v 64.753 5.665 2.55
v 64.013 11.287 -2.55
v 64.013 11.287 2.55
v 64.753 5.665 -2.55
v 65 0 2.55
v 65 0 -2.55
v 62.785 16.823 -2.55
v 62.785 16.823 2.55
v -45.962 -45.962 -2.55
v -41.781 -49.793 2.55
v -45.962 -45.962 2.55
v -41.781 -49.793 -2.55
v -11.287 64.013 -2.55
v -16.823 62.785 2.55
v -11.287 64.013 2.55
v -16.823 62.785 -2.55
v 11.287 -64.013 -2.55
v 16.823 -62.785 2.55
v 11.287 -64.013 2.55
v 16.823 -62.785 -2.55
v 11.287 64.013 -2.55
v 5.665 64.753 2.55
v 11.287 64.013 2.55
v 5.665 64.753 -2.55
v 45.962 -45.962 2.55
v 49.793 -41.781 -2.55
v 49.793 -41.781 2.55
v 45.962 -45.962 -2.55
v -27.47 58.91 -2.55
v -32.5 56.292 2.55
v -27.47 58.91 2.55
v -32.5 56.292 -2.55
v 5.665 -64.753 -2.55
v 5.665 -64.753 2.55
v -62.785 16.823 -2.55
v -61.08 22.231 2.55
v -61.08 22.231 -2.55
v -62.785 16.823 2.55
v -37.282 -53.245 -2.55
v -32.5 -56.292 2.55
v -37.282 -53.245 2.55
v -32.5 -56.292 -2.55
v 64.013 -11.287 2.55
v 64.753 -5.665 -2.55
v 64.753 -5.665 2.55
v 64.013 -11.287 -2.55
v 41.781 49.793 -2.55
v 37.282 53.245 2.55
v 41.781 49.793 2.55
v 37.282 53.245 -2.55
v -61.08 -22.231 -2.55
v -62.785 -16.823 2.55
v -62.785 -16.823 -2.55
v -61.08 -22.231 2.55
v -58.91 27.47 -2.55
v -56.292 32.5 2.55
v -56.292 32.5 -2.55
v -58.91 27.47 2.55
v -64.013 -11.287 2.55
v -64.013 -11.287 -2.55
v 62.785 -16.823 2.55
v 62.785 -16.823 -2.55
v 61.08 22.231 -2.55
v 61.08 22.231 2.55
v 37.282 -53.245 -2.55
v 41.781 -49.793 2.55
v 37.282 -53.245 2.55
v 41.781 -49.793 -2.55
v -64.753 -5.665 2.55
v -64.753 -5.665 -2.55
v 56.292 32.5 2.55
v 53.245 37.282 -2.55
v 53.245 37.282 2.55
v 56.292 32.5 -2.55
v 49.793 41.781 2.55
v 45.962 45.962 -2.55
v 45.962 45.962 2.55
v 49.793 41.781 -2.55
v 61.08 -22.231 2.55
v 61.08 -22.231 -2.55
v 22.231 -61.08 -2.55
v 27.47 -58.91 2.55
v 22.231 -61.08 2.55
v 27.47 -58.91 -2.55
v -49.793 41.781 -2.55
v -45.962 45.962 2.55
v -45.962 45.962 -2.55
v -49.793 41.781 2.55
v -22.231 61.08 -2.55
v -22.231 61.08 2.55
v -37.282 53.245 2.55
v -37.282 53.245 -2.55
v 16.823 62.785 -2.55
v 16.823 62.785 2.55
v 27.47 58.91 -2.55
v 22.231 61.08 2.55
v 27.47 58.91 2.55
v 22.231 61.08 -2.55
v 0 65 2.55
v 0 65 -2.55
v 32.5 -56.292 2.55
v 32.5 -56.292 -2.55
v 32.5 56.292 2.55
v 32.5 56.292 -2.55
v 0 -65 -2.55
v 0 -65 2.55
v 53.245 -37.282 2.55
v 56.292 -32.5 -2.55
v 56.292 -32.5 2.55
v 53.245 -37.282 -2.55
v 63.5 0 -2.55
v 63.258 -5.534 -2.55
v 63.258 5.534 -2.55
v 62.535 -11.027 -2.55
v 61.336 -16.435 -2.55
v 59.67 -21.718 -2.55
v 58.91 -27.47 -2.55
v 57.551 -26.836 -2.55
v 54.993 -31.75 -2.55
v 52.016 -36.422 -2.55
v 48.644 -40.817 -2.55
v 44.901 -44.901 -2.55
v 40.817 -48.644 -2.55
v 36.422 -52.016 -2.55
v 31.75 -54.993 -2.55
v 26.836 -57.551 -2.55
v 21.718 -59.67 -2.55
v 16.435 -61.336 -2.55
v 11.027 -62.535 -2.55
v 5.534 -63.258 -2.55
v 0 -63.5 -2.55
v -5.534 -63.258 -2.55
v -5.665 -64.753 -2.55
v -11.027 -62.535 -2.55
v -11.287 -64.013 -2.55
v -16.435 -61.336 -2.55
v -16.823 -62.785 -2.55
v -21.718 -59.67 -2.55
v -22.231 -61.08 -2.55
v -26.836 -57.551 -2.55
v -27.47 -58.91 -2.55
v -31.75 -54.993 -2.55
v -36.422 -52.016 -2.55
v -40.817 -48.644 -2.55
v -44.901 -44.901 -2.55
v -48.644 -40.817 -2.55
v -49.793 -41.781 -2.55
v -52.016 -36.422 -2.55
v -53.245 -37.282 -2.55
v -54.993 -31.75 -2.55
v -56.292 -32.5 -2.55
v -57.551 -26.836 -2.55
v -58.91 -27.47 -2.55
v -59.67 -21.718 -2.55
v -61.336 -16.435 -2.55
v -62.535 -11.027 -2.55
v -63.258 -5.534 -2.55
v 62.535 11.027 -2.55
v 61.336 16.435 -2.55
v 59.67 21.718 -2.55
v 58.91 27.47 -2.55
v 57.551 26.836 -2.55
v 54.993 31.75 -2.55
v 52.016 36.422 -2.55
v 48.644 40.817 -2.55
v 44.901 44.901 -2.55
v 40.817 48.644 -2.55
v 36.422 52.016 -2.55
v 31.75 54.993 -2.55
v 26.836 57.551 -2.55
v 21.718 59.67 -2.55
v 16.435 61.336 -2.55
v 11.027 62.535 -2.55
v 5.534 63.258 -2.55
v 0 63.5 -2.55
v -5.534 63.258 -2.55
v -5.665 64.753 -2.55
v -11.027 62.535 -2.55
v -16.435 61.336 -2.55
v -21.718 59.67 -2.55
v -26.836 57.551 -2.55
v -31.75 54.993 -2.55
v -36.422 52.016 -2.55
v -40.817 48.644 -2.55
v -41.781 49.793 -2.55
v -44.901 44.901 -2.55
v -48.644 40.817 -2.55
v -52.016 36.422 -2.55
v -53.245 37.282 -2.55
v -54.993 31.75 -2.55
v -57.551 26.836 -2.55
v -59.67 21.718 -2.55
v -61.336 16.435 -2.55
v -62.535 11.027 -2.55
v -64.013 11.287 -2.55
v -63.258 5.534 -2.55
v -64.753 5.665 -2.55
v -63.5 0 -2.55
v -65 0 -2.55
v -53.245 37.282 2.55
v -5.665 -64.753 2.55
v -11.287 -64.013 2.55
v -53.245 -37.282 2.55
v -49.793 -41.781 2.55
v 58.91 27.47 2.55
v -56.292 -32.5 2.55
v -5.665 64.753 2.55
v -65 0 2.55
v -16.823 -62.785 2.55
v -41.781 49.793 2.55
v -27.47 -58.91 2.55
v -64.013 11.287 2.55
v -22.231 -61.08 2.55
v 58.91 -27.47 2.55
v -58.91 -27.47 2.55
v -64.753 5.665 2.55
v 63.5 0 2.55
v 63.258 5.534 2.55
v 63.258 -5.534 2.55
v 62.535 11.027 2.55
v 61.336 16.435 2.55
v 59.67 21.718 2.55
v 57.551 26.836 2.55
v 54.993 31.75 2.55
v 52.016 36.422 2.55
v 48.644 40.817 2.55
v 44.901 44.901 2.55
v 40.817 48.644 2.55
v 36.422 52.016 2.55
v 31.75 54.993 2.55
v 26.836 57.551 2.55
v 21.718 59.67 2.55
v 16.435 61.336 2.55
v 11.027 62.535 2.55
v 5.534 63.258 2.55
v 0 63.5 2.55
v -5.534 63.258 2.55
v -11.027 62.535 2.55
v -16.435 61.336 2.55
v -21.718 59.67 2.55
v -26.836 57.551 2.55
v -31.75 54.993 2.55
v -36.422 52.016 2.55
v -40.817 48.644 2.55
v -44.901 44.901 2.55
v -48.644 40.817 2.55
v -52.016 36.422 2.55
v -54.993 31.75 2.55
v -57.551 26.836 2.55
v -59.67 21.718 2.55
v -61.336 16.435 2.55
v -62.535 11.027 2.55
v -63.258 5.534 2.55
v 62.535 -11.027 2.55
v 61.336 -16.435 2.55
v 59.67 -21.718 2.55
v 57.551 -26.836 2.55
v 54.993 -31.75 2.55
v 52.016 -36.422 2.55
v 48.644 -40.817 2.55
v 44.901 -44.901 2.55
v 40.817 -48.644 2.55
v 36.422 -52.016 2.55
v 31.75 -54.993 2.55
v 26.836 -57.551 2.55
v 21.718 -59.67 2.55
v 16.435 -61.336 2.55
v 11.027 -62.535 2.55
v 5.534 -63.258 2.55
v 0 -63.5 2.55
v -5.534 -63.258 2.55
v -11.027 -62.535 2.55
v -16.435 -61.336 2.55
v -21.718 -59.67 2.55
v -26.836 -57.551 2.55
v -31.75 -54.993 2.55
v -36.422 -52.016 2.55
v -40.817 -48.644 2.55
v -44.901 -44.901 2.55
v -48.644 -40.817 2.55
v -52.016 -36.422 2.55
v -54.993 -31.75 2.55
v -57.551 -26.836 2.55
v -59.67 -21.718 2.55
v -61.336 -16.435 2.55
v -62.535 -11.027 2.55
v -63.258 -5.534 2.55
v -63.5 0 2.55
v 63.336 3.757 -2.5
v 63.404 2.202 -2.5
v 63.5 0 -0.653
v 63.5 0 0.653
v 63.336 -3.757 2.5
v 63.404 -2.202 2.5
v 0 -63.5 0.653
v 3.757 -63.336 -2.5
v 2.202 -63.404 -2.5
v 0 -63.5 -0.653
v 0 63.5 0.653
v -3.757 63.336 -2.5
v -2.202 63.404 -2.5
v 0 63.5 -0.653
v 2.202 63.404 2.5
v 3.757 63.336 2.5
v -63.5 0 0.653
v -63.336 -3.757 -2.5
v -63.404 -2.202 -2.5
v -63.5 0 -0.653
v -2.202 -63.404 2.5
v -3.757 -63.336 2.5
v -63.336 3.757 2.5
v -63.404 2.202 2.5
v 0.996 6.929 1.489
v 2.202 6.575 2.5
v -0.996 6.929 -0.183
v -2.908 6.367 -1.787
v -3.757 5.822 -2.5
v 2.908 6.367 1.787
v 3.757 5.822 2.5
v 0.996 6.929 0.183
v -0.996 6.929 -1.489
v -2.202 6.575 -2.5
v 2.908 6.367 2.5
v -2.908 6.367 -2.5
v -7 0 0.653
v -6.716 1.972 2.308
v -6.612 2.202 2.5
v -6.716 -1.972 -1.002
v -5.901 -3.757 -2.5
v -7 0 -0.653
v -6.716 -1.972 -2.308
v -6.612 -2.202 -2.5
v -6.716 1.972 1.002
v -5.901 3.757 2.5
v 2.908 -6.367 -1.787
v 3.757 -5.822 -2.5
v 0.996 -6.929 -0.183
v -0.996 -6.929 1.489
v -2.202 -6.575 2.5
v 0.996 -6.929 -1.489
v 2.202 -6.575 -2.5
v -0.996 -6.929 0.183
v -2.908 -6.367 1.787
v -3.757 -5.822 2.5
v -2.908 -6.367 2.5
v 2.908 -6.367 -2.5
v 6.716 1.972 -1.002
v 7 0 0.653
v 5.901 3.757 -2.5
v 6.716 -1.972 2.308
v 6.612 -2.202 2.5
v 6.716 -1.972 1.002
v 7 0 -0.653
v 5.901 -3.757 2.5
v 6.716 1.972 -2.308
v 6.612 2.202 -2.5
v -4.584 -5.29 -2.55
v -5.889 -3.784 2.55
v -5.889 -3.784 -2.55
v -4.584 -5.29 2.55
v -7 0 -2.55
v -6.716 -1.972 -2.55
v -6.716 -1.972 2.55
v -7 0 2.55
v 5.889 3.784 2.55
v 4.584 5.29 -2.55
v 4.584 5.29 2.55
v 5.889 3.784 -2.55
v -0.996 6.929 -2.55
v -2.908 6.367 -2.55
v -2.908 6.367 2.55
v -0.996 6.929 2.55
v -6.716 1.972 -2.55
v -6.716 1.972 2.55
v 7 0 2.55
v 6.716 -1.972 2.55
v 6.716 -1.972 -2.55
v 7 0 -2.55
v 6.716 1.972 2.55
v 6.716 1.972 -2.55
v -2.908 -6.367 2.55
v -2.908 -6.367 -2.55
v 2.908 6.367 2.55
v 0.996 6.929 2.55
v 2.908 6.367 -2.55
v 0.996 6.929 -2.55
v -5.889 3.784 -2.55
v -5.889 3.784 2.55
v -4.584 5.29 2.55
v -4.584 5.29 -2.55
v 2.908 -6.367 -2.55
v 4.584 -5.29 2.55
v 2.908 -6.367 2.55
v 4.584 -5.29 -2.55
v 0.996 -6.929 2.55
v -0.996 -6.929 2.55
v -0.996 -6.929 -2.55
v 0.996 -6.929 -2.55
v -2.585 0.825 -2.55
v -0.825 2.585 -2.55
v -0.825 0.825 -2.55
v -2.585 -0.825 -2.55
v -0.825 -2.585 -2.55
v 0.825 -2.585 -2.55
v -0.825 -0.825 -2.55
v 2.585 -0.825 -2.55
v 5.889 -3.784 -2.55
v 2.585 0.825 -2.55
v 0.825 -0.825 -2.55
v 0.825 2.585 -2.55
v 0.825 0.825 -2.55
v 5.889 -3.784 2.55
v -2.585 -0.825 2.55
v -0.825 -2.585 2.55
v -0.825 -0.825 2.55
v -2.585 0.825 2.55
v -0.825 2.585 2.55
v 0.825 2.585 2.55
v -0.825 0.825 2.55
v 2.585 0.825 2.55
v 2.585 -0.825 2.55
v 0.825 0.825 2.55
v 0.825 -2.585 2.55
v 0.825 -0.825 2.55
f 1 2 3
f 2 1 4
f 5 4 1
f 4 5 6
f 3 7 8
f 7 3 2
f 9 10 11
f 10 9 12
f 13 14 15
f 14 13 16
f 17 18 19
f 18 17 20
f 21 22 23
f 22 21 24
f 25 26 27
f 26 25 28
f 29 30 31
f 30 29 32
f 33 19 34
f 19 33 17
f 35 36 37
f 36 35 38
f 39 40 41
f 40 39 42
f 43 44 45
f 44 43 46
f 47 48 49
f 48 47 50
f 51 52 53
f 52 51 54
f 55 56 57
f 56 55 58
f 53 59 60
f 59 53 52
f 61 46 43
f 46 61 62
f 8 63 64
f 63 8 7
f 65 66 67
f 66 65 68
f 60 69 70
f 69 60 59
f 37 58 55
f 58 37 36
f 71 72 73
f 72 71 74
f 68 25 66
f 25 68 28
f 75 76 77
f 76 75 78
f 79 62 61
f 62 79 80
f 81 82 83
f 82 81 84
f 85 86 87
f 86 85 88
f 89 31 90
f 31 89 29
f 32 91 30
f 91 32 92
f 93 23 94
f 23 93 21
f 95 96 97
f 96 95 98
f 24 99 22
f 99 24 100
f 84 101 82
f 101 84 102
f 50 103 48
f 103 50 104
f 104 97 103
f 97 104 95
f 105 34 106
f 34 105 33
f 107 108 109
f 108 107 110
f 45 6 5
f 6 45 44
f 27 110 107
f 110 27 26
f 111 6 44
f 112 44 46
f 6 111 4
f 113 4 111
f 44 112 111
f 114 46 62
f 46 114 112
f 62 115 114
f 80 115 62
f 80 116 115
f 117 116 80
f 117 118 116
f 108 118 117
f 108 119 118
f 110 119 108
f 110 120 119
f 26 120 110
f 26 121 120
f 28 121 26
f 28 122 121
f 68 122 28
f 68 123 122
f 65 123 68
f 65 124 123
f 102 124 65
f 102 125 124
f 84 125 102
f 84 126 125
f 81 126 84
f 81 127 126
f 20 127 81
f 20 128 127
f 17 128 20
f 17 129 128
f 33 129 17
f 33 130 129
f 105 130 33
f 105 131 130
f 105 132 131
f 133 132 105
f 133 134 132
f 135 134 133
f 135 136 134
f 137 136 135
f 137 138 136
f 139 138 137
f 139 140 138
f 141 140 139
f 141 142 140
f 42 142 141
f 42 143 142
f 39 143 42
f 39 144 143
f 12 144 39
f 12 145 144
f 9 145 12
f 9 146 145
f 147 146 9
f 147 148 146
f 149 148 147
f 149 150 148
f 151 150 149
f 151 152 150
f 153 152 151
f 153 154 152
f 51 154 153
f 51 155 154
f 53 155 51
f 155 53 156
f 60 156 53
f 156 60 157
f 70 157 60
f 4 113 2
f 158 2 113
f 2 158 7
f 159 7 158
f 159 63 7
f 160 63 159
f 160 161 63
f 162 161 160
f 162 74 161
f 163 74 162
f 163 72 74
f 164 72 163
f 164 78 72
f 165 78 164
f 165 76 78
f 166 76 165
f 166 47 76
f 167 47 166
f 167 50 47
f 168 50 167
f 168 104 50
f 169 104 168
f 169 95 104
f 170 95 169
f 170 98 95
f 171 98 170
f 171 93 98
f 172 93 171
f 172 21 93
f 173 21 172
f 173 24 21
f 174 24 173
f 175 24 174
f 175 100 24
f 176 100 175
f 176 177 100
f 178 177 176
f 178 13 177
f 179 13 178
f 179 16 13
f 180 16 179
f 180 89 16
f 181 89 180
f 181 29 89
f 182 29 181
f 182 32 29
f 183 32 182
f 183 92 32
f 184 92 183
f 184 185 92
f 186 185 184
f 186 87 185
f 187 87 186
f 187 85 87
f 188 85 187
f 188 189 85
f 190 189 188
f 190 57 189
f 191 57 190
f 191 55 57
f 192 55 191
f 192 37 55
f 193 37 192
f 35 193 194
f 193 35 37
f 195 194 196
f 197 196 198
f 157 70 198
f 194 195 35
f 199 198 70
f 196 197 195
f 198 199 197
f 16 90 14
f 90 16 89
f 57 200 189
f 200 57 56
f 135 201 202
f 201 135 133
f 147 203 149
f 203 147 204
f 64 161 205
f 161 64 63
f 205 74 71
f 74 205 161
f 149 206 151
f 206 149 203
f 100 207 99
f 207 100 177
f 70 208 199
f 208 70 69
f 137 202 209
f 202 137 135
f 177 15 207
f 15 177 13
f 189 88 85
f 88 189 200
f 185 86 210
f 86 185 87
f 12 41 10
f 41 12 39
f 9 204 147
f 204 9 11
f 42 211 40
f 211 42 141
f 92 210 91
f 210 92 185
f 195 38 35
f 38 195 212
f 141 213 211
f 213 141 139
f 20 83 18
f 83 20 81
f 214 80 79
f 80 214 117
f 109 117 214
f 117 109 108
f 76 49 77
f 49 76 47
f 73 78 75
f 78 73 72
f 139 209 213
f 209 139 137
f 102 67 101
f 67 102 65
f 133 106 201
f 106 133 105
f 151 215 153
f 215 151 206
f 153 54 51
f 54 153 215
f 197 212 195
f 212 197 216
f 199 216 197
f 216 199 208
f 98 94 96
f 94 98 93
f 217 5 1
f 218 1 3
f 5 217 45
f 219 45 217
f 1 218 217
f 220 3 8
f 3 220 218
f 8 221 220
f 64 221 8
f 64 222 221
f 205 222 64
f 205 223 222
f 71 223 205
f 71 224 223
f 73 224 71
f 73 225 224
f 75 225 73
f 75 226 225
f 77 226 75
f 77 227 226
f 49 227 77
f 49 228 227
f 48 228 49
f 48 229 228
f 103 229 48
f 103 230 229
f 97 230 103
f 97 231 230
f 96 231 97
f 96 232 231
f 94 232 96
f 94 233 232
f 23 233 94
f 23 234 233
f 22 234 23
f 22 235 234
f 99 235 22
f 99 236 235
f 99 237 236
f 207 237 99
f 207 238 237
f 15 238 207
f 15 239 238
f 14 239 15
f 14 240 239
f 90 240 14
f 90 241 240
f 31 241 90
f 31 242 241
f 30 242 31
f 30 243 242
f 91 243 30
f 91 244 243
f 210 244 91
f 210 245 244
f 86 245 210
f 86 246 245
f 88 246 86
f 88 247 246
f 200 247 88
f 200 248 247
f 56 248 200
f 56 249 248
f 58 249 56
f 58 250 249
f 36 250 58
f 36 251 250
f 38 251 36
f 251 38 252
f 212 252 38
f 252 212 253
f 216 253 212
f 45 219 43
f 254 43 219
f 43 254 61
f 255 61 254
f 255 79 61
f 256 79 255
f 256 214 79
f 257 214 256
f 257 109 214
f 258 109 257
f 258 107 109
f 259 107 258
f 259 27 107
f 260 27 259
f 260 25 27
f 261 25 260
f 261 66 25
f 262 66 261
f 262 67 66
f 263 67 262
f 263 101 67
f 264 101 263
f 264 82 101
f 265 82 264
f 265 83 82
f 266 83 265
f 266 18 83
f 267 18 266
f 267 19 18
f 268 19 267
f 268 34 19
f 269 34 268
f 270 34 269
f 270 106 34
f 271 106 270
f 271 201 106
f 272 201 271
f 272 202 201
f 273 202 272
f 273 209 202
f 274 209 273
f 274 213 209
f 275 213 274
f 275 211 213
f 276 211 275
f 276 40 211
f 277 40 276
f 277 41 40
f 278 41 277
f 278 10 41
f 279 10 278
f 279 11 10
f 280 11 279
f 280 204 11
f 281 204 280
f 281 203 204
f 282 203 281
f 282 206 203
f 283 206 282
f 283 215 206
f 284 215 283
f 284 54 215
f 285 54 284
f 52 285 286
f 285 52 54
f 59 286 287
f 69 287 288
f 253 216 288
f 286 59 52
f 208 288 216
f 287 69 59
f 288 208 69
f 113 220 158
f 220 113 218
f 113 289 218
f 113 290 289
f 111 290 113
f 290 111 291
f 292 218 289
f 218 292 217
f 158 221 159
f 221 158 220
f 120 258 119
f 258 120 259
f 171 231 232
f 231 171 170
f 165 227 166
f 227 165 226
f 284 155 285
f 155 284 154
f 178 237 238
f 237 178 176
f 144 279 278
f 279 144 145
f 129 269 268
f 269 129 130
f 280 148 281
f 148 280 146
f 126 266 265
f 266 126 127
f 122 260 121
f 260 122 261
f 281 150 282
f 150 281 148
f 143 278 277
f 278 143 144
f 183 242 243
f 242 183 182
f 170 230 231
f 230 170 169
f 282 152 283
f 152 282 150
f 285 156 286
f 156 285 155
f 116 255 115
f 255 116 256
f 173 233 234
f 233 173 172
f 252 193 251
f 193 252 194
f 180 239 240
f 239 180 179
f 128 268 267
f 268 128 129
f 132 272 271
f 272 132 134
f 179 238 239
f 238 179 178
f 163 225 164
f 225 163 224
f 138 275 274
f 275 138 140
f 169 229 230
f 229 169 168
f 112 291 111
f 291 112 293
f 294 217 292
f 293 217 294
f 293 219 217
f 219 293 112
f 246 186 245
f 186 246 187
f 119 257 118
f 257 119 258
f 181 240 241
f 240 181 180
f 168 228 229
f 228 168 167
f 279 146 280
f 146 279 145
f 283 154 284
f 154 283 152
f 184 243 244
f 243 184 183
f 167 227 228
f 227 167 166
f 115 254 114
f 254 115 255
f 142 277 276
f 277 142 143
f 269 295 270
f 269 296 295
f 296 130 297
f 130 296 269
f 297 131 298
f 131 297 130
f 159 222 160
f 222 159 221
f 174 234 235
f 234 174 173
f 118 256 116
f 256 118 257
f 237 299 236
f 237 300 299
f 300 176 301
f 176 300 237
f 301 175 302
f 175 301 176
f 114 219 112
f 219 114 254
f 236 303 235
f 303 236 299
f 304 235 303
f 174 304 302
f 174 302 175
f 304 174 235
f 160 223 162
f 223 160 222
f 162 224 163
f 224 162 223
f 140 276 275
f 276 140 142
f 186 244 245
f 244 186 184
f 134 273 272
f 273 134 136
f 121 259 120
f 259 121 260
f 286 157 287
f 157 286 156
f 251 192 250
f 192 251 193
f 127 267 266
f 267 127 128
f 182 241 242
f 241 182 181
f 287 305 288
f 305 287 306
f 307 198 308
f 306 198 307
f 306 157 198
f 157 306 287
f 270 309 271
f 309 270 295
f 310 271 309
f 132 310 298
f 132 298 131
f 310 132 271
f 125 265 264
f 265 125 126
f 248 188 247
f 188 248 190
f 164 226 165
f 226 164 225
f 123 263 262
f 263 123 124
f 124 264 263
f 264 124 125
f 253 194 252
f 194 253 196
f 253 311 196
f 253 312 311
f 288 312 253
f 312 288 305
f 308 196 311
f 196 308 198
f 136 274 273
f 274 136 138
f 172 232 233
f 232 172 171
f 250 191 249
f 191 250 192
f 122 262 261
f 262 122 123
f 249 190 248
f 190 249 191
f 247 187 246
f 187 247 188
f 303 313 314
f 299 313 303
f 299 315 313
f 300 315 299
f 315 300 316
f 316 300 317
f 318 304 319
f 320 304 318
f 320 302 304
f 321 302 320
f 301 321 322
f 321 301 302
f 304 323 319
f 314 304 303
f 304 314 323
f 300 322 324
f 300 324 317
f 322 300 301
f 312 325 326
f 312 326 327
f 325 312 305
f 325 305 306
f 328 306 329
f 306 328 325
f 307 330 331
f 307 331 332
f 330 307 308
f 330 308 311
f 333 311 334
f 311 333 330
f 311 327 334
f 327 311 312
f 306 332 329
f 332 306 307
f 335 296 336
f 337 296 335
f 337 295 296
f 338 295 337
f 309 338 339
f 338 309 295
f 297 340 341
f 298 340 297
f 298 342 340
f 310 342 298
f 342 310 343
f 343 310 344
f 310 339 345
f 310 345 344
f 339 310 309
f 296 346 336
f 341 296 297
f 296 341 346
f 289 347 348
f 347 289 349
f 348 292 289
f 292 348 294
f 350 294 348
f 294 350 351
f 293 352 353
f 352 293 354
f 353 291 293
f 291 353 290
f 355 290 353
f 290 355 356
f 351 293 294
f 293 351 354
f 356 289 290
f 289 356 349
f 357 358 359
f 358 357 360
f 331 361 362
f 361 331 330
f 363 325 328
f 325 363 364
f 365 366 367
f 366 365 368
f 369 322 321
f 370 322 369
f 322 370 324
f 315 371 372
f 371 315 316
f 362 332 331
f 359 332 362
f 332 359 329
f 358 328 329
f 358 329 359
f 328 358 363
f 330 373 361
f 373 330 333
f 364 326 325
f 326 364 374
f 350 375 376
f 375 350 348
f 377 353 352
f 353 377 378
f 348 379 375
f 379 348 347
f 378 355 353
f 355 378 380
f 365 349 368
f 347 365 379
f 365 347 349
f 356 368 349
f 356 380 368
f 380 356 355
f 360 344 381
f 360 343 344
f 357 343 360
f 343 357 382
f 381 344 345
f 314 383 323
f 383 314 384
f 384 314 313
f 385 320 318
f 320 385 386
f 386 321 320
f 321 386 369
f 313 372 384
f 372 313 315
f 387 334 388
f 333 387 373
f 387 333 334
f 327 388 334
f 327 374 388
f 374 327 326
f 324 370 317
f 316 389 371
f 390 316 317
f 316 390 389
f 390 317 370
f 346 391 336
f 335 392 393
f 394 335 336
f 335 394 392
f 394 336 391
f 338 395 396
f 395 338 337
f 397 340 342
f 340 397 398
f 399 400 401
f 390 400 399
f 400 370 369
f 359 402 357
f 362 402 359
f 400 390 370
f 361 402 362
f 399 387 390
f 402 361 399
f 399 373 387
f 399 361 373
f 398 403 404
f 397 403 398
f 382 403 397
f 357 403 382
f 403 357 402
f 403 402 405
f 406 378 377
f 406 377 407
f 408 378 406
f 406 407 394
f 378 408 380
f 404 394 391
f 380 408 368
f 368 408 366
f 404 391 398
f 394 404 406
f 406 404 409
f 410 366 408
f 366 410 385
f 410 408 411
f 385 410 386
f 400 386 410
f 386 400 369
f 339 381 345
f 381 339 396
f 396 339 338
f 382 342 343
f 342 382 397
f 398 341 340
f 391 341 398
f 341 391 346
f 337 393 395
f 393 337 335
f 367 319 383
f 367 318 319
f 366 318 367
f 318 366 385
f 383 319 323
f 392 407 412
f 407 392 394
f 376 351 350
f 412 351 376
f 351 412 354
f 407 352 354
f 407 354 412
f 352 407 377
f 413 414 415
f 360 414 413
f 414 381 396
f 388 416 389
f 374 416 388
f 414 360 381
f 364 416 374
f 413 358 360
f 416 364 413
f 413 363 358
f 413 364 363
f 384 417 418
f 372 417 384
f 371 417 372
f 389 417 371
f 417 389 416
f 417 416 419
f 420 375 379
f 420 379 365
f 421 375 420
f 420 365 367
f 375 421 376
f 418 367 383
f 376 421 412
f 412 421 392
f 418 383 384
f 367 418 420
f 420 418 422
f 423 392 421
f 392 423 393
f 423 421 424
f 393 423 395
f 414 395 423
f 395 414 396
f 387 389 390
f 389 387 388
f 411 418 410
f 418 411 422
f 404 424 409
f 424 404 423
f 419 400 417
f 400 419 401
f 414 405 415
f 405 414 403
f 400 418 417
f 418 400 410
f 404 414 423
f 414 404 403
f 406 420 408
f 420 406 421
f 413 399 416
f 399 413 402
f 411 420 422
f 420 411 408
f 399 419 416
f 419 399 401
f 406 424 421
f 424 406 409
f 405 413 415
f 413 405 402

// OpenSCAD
/*****************************************************************************
    Propeller 
	
	Modified from: https://www.thingiverse.com/thing:291404/files			
                                    
*****************************************************************************/

// Thickness of outer ring wall.
outer_ring_thickness = 1.5;
outer_ring_od = 130;
blade_thickness = 1.0;
blade_angle = -40;
hub_od = 14;
slot_width = 11.25;
slot_length = 6;

// Overall height of the whole propeller.
thickness = 5;

// Rotational offset of first blade (to match originals).
rotational_offset = 90;

// Number of blades.
n_blades = 4;

/* [Hidden] */
slop = 0.1;

Propeller();

//---------------------------------------------------------------------
//
//---------------------------------------------------------------------
module Propeller()
{  
	difference() 
	{
	  union() 
	  {
		ring();
		blades();
		hub();
	  }
	  //slot();
	  slotCross();
	}
}  

//---------------------------------------------------------------------
//
//---------------------------------------------------------------------
module ring() {
  difference() {
    cylinder(h = thickness + slop, r = outer_ring_od/2, center = true, $fa = 5, $fs = 0.5);
    cylinder(h = thickness + 2*slop, r = outer_ring_od/2 - outer_ring_thickness, center = true, $fa = 5, $fs = 0.5);
  }
}

//---------------------------------------------------------------------
//
//---------------------------------------------------------------------
module blade() {
  difference() {
    difference() {
      rotate([blade_angle, 0, 0])
      translate([0, -25, -blade_thickness/2])
      cube([outer_ring_od/2 - outer_ring_thickness/2, 50, blade_thickness]);
    }
    translate([0, 0, thickness/2 + 10])
    cube([outer_ring_od, outer_ring_od, 20], center=true);
    translate([0, 0, -(thickness/2 + 10)])
    cube([outer_ring_od, outer_ring_od, 20], center=true);
  }
}

//---------------------------------------------------------------------
//
//---------------------------------------------------------------------
module blades() 
{
  for (i = [0 : n_blades - 1]) {
    rotate([0, 0, rotational_offset + i * 360/n_blades]) blade();
  }
}

module slot() 
{
  intersection() {
    cylinder(h = 2*thickness, r = slot_width/2, center = true);
    cube([slot_width + slop, slot_length, 2*thickness], center = true);
  }
}

module slotCross() 
{
	rotate([0, 90, 0])
	{
		scale(1.1)
			lego_axle_mm(thickness * 2);
	}
}

/*------------------------------------------------------------------  
------------------------------------------------------------------*/
module hub() {
  difference() {
    cylinder(h = thickness + slop, r = hub_od/2, center = true);
  }
}


/*------------------------------------------------------------------  
------------------------------------------------------------------*/
module lego_axle_mm(axle_length_mm) 
{
    // Brand-independent measurements.
    axle_spline_width = 1.5;   
    axle_diameter = 4.7;   

	union() 
	{
		cube([axle_length_mm, axle_diameter, axle_spline_width],center=true);
		cube([axle_length_mm, axle_spline_width, axle_diameter],center=true);
	}
}

//difference() {
  //union() {
    //ring();
//    blades();
//    hub();
  //}
//  slot();
//}
